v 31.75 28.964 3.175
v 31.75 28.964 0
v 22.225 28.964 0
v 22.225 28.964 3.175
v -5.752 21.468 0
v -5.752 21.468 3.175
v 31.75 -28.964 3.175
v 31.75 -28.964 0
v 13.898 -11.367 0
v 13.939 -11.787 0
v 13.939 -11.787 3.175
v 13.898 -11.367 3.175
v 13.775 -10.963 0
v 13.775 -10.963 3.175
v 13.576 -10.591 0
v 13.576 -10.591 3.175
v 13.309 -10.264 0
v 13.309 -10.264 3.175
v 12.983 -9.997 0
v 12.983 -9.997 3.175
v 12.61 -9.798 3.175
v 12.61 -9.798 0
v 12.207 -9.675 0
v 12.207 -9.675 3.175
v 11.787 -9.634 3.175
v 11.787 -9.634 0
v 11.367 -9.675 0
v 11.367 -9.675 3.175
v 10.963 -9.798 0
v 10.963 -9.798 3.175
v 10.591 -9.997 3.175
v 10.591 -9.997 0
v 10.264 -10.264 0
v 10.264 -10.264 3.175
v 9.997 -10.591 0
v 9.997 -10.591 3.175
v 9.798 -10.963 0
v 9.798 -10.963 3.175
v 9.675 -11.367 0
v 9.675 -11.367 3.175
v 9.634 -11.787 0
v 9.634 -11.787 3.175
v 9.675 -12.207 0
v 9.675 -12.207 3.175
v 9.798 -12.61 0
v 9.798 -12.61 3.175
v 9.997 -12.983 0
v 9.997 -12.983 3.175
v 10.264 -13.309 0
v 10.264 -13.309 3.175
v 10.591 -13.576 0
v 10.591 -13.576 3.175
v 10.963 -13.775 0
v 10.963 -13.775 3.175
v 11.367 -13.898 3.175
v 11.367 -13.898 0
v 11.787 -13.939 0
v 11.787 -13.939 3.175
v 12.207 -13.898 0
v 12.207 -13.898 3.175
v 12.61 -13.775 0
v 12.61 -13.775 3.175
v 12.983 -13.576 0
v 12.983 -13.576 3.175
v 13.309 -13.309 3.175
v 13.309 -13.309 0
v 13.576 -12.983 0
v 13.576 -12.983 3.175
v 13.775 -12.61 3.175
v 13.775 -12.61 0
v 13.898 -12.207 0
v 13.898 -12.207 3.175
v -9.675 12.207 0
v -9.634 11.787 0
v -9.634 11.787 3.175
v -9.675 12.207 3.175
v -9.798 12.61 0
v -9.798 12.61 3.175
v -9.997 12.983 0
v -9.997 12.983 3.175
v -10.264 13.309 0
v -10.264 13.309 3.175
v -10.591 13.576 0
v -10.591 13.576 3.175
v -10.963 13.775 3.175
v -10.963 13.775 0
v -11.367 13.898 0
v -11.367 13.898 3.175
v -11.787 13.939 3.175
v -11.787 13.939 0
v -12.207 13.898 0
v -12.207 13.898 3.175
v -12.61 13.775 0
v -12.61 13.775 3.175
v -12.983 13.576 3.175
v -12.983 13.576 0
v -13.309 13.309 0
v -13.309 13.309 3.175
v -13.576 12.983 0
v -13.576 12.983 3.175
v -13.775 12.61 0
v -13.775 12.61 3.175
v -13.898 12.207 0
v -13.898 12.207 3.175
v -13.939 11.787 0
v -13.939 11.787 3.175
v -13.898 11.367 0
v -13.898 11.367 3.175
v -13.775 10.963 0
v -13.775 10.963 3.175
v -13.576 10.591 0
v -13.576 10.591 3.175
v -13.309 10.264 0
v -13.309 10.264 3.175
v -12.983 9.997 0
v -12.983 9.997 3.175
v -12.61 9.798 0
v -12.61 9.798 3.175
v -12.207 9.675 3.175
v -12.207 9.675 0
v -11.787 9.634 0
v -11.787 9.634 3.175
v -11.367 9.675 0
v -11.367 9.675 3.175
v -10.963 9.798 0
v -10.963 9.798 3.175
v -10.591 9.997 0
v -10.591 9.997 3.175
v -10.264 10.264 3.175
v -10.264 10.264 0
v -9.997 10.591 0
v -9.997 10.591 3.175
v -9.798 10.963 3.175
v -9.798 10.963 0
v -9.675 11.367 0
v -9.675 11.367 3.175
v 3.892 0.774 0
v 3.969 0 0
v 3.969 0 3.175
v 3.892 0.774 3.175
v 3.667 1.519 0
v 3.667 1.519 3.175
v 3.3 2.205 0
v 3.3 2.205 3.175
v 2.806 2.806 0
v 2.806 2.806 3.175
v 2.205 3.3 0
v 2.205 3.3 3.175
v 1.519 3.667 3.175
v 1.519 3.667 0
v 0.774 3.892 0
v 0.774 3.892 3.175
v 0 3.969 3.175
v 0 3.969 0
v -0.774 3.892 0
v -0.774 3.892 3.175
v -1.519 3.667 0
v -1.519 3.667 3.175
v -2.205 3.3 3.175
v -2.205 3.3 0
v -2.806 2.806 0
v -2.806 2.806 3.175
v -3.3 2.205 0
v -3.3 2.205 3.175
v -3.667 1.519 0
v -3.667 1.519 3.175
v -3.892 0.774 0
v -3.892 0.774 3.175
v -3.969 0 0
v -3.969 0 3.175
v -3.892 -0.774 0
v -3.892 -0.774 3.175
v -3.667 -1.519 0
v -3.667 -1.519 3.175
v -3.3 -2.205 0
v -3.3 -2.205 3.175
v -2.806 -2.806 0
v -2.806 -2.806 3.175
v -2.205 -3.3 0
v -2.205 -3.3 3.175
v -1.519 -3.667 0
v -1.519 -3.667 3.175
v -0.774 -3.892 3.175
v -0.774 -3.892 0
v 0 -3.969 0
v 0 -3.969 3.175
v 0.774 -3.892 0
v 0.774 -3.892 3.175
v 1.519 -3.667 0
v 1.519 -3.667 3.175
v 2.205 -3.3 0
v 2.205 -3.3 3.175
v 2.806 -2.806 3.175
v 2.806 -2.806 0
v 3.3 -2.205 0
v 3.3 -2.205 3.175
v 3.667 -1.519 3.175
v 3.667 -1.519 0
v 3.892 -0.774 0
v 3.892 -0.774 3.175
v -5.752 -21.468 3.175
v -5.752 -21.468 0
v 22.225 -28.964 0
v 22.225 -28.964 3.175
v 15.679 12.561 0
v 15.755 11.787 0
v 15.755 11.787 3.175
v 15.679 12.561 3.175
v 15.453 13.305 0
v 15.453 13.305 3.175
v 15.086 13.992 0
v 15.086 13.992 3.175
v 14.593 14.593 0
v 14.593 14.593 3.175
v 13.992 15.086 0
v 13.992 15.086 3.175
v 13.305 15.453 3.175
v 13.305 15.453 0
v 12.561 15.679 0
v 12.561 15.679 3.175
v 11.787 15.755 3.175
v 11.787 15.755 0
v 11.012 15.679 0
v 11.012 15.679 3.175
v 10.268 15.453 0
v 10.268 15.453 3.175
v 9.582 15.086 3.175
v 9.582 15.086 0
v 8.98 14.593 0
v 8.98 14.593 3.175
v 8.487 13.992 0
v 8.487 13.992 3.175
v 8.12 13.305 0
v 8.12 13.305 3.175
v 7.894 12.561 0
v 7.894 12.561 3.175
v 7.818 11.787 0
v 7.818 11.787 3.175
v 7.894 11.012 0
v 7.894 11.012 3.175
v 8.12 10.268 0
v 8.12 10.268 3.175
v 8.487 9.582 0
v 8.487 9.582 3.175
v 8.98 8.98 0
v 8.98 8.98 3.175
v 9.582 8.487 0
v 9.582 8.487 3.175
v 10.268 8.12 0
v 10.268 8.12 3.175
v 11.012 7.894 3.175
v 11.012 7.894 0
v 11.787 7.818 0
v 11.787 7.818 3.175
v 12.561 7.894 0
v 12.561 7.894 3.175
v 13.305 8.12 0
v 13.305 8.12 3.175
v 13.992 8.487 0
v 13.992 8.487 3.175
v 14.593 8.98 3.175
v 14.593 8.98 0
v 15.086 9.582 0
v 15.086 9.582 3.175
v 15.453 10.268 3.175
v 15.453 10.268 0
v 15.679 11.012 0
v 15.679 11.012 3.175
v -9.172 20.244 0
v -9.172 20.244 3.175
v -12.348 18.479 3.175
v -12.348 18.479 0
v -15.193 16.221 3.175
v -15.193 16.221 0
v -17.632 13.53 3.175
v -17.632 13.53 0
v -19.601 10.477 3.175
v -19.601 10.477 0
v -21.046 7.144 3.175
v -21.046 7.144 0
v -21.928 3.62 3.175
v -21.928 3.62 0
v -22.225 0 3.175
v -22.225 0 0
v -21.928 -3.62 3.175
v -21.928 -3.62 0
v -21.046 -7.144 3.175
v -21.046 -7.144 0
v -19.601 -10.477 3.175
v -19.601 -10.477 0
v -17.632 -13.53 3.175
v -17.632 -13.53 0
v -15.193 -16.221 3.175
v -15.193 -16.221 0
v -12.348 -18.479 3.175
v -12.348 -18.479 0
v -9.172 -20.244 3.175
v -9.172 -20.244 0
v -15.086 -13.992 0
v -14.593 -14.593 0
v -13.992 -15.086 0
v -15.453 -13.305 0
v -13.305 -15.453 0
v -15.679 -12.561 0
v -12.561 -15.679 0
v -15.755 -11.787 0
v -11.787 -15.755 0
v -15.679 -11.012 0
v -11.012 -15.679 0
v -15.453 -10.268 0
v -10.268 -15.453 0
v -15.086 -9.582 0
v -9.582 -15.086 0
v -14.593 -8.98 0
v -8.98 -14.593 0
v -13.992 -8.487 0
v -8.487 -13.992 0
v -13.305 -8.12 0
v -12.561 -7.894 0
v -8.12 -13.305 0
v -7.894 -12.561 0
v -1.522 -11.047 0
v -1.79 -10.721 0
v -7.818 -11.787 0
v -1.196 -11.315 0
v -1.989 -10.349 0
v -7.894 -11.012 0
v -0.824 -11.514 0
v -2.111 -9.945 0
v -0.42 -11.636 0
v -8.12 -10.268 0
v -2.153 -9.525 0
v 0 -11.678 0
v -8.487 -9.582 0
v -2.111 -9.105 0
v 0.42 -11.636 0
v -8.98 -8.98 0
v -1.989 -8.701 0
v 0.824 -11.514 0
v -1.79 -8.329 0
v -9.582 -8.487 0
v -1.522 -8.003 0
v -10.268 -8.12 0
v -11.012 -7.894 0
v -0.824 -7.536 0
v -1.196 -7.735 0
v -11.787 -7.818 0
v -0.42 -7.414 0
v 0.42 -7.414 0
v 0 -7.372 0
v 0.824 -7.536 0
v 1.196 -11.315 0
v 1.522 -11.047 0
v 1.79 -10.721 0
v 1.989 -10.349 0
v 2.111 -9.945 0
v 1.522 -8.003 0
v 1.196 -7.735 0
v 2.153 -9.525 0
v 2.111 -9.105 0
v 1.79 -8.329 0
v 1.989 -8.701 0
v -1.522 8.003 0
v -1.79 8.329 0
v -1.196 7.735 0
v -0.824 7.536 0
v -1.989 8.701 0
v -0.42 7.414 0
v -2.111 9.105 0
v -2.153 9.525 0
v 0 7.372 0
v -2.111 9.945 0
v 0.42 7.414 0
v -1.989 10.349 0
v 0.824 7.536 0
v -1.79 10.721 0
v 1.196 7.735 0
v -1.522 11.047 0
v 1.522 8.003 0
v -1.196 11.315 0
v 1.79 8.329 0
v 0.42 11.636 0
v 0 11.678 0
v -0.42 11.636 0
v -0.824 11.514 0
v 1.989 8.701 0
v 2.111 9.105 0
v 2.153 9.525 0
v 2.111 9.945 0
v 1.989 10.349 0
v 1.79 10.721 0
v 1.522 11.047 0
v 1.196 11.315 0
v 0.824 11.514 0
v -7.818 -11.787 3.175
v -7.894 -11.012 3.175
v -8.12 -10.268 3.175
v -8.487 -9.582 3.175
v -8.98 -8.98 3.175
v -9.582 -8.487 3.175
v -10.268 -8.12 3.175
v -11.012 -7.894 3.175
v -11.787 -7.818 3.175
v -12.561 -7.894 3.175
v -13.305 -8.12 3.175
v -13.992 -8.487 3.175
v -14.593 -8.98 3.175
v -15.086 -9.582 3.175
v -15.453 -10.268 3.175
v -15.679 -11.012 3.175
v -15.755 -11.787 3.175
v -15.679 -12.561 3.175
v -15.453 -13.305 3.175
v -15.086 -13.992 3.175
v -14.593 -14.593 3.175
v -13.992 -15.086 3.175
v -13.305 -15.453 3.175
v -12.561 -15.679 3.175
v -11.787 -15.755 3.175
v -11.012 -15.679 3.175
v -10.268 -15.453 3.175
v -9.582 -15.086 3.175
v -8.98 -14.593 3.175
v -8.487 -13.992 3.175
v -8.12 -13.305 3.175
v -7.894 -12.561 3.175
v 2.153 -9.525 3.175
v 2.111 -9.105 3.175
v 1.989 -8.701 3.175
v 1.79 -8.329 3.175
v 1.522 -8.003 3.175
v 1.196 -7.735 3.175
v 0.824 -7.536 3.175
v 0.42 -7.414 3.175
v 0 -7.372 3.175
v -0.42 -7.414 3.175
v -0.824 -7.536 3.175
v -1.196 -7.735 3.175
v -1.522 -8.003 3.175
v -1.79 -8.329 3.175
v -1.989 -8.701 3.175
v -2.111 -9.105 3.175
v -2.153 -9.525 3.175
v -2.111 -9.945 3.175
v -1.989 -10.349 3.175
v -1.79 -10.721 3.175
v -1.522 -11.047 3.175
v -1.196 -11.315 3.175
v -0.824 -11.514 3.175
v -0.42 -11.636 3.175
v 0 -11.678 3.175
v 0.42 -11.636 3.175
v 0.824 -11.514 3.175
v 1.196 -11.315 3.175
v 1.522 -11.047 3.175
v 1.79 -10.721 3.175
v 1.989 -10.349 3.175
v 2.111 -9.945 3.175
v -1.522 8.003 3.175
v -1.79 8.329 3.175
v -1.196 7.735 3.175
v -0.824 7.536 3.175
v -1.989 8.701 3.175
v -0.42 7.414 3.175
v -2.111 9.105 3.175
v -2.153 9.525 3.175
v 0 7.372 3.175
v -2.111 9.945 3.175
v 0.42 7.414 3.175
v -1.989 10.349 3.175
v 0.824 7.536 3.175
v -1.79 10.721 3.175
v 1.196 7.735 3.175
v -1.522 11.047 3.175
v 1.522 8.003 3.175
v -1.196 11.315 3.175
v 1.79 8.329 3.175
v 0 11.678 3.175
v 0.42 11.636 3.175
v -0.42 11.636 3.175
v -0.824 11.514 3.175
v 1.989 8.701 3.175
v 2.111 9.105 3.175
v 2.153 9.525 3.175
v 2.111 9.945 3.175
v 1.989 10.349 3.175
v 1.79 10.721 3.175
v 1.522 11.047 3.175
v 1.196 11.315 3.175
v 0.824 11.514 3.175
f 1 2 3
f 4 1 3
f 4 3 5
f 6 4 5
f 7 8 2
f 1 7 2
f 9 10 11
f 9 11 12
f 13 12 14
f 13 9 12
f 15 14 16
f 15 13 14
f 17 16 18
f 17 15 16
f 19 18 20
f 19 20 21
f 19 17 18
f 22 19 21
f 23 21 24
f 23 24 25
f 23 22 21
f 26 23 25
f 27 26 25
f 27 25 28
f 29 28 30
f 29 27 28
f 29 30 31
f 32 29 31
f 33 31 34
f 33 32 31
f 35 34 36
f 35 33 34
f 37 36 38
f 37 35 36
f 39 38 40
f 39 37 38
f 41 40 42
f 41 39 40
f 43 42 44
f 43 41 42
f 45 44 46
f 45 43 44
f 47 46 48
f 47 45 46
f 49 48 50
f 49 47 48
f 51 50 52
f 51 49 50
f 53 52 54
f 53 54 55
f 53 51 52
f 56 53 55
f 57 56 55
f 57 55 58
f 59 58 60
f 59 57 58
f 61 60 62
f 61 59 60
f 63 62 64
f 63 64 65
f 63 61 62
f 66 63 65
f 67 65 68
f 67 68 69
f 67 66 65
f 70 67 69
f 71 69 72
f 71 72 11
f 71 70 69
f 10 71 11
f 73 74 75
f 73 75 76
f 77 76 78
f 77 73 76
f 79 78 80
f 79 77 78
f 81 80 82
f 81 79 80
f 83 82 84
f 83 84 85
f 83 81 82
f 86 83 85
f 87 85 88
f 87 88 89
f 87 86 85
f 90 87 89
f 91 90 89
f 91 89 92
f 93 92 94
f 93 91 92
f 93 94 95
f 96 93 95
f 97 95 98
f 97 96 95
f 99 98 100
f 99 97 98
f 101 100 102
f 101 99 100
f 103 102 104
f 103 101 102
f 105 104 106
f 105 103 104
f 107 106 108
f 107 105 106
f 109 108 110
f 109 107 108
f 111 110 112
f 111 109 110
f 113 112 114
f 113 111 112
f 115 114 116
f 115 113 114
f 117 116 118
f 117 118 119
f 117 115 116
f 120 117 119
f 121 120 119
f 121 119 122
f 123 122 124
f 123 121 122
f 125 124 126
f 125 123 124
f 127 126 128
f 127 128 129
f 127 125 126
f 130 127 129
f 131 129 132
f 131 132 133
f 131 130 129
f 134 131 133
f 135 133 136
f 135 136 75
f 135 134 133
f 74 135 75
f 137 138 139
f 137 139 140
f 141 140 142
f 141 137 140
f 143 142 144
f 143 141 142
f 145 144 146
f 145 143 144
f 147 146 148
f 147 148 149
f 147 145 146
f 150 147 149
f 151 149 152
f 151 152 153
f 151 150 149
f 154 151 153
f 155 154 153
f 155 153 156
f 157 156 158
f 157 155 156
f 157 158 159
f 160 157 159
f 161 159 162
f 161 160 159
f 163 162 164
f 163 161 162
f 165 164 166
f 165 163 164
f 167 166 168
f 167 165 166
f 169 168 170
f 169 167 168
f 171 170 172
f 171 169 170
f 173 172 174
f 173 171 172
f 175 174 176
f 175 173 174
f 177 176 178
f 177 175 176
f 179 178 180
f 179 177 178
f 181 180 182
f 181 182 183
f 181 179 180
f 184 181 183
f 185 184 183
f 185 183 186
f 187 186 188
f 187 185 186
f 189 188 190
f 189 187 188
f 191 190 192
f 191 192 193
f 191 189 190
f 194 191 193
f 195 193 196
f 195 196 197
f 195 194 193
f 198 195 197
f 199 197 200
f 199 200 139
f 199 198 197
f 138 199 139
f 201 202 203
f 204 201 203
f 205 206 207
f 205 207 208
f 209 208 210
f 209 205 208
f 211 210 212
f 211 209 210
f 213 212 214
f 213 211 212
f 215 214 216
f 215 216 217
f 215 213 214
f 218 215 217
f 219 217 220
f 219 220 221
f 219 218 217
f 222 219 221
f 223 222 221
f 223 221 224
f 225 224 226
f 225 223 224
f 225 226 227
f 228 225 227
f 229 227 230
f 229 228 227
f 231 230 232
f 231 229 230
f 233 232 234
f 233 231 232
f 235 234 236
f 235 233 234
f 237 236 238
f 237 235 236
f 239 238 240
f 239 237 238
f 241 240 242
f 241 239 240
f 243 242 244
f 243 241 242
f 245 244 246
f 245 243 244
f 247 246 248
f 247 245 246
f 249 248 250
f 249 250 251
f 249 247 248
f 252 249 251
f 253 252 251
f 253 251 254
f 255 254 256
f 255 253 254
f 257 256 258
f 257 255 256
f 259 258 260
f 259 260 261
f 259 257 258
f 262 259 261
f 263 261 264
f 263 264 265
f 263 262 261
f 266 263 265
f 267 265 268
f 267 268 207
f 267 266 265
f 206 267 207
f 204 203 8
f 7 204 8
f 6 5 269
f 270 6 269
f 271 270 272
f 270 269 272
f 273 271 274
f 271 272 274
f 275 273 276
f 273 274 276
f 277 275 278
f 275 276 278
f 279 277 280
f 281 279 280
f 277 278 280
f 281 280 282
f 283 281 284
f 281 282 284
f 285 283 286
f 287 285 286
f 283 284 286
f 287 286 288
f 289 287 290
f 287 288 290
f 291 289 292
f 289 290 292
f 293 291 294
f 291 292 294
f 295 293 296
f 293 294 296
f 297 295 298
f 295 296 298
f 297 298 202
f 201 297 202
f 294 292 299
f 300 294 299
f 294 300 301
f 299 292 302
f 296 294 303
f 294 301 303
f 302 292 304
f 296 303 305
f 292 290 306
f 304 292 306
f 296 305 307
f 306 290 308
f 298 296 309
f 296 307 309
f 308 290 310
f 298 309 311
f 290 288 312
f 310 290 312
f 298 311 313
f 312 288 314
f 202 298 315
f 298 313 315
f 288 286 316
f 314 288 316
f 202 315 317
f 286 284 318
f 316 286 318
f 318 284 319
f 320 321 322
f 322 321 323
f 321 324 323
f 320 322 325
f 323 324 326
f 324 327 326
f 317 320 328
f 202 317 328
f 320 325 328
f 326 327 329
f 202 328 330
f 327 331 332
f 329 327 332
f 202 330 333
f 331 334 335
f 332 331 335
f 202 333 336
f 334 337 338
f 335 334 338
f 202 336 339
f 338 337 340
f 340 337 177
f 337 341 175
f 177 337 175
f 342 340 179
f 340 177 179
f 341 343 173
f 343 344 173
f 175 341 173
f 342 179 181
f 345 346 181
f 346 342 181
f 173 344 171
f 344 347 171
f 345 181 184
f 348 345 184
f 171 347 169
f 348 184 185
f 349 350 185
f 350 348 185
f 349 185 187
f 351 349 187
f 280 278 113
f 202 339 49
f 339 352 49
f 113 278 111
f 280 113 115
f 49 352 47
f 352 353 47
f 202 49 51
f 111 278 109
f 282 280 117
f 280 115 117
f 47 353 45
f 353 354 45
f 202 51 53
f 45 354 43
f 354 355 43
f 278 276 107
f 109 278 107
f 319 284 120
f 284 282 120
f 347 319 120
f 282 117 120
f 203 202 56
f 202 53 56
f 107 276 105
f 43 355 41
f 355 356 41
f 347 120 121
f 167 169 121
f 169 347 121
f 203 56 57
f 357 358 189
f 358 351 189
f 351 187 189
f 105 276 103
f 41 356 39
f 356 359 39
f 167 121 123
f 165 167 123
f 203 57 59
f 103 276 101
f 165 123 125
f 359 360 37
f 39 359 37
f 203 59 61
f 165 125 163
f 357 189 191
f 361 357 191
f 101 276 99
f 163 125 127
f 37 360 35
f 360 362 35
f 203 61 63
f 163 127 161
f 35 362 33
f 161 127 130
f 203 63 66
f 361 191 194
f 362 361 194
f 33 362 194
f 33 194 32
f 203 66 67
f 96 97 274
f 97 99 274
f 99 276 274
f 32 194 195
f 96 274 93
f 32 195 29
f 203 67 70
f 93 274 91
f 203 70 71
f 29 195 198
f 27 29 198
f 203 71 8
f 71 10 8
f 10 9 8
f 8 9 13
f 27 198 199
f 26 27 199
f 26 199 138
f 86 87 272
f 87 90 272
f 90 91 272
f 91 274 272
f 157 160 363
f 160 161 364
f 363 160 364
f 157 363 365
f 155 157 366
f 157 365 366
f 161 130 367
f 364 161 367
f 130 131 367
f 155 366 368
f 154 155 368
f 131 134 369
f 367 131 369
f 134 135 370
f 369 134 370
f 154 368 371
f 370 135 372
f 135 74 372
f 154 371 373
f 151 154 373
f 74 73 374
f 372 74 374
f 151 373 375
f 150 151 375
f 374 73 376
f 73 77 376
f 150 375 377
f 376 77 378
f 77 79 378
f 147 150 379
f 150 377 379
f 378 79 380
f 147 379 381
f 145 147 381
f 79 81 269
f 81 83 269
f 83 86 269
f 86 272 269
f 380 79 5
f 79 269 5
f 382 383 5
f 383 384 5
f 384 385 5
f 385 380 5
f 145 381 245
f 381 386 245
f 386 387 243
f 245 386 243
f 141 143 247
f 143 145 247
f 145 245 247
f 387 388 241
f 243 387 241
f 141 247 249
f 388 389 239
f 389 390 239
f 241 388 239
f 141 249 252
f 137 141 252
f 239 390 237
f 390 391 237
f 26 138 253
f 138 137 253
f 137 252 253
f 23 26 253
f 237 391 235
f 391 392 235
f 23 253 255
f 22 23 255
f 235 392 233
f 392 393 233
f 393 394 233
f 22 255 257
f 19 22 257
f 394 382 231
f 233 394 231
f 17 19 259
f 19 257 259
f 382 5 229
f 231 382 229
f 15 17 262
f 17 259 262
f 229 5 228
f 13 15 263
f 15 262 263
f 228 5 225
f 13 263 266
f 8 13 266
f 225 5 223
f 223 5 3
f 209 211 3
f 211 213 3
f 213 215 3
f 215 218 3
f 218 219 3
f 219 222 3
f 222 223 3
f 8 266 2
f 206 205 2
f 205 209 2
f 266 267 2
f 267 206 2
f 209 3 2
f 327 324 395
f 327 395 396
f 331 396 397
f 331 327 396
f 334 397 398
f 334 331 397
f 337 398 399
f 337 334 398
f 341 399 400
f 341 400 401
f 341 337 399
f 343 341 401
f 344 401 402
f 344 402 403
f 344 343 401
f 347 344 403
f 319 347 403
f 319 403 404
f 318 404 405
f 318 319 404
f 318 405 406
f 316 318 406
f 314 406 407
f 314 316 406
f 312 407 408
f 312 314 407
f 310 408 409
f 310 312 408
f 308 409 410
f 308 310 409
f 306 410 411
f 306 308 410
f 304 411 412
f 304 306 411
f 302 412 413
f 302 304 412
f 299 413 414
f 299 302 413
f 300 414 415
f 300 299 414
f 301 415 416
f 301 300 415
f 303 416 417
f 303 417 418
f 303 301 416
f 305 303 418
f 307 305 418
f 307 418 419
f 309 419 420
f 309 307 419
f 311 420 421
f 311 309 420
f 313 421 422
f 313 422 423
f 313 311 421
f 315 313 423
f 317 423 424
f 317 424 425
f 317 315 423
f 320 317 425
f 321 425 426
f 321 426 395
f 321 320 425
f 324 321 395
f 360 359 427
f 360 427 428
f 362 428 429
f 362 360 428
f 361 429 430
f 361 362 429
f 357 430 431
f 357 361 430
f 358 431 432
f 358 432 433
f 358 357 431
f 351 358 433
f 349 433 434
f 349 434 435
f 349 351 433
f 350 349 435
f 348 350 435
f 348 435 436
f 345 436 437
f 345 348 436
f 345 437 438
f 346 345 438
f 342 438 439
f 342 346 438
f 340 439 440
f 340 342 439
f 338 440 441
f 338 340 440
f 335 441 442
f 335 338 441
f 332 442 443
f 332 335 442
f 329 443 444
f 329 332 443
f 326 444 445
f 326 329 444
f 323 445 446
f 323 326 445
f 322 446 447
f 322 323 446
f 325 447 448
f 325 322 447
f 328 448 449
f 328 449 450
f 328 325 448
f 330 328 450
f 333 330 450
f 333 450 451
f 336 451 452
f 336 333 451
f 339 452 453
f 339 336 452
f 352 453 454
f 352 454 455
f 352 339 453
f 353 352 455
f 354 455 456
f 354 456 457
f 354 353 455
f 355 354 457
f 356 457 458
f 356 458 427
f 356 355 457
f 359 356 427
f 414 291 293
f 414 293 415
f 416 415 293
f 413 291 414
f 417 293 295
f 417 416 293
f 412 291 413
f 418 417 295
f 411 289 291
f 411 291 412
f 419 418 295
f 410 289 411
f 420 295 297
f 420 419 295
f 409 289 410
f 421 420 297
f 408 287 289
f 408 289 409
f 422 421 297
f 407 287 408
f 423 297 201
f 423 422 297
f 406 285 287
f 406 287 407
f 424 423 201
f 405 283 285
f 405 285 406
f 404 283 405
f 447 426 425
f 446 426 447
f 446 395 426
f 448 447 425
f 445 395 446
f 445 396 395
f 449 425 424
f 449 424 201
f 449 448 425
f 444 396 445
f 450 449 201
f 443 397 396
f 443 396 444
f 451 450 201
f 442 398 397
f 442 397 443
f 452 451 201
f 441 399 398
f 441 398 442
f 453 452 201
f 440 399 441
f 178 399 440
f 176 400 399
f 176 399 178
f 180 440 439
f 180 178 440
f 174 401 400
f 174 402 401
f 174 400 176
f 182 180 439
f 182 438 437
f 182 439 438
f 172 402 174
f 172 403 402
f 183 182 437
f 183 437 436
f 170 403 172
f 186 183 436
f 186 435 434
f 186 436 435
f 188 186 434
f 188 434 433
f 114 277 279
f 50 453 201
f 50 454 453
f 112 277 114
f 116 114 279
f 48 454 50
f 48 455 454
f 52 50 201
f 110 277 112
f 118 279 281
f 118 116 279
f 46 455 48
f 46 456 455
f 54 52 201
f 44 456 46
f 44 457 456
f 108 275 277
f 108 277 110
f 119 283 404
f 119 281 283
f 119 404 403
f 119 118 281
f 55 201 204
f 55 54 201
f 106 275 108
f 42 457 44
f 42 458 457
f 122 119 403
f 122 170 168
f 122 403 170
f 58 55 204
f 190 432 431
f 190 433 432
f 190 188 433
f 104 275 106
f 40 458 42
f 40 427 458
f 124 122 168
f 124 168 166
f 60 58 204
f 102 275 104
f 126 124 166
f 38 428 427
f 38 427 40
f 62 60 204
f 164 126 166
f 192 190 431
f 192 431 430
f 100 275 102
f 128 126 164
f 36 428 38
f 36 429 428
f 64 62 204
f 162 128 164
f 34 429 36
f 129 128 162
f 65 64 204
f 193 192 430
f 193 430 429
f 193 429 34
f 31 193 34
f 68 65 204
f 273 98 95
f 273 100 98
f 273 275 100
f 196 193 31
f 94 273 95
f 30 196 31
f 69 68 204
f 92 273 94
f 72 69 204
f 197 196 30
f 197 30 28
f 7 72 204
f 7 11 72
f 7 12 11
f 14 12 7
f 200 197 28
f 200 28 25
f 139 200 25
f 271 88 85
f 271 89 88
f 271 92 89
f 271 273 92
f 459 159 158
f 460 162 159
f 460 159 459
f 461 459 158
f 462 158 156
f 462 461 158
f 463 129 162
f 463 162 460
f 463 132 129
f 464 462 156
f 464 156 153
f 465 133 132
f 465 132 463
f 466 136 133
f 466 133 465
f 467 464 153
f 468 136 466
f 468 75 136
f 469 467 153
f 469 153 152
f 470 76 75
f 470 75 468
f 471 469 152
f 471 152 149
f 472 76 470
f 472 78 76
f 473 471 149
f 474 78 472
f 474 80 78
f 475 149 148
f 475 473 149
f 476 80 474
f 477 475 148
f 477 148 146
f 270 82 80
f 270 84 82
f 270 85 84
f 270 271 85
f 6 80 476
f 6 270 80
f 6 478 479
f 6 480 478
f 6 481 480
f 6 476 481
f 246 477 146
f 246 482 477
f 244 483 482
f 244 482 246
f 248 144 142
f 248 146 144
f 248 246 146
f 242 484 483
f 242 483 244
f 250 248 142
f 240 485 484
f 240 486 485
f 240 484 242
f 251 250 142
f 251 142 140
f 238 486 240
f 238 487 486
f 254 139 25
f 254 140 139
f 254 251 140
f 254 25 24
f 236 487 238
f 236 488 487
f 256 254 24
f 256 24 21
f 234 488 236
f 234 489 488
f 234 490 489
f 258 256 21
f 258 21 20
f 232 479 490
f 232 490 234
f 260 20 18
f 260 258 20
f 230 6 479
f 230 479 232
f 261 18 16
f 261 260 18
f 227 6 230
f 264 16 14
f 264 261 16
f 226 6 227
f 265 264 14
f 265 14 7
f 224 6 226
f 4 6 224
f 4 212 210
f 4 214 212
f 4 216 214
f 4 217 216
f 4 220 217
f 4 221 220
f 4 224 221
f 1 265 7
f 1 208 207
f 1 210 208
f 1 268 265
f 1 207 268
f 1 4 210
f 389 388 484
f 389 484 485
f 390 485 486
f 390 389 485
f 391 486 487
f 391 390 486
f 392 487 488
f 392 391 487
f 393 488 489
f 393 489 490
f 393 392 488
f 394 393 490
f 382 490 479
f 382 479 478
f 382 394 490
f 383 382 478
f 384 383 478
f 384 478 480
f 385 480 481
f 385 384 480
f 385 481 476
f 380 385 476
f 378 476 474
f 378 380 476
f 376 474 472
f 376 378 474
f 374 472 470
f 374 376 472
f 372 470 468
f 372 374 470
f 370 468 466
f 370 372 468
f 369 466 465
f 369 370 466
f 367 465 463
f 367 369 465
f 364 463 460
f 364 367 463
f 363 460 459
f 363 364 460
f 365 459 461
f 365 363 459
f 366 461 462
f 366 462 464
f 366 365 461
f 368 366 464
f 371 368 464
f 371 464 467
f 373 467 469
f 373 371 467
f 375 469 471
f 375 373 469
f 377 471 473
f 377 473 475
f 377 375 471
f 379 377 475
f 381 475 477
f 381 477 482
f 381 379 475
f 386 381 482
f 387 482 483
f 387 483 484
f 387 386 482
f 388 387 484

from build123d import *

# Parameters (mm, degrees)
F0_R     = 3.96875
F0_R_2   = 2.15265
F1_DEPTH = 3.175


with BuildPart() as f1:
    # F0 (on Top) → F1 (new body)
    with BuildSketch(Plane.XY):
        with BuildLine():
            Line((31.75, 28.964184), (22.225, 28.964184))
            Line((22.225, 28.964184), (-5.752253, 21.467701))
            ThreePointArc((-5.752253, 21.467701), (-22.225, 0), (-5.752253, -21.467701))
            Line((-5.752253, -21.467701), (22.225, -28.964184))
            Line((22.225, -28.964184), (31.75, -28.964184))
            Line((31.75, -28.964184), (31.75, 28.964184))
        make_face()
        with Locations((-11.786586, -11.786586)):
            Circle(F0_R, mode=Mode.SUBTRACT)
        with Locations((0, -9.525)):
            Circle(F0_R_2, mode=Mode.SUBTRACT)
        with Locations((11.786586, -11.786586)):
            Circle(F0_R_2, mode=Mode.SUBTRACT)
        with Locations((-11.786586, 11.786586)):
            Circle(F0_R_2, mode=Mode.SUBTRACT)
        Circle(F0_R, mode=Mode.SUBTRACT)
        with Locations((0, 9.525)):
            Circle(F0_R_2, mode=Mode.SUBTRACT)
        with Locations((11.786586, 11.786586)):
            Circle(F0_R, mode=Mode.SUBTRACT)
    extrude(amount=F1_DEPTH)


solid = f1.part
